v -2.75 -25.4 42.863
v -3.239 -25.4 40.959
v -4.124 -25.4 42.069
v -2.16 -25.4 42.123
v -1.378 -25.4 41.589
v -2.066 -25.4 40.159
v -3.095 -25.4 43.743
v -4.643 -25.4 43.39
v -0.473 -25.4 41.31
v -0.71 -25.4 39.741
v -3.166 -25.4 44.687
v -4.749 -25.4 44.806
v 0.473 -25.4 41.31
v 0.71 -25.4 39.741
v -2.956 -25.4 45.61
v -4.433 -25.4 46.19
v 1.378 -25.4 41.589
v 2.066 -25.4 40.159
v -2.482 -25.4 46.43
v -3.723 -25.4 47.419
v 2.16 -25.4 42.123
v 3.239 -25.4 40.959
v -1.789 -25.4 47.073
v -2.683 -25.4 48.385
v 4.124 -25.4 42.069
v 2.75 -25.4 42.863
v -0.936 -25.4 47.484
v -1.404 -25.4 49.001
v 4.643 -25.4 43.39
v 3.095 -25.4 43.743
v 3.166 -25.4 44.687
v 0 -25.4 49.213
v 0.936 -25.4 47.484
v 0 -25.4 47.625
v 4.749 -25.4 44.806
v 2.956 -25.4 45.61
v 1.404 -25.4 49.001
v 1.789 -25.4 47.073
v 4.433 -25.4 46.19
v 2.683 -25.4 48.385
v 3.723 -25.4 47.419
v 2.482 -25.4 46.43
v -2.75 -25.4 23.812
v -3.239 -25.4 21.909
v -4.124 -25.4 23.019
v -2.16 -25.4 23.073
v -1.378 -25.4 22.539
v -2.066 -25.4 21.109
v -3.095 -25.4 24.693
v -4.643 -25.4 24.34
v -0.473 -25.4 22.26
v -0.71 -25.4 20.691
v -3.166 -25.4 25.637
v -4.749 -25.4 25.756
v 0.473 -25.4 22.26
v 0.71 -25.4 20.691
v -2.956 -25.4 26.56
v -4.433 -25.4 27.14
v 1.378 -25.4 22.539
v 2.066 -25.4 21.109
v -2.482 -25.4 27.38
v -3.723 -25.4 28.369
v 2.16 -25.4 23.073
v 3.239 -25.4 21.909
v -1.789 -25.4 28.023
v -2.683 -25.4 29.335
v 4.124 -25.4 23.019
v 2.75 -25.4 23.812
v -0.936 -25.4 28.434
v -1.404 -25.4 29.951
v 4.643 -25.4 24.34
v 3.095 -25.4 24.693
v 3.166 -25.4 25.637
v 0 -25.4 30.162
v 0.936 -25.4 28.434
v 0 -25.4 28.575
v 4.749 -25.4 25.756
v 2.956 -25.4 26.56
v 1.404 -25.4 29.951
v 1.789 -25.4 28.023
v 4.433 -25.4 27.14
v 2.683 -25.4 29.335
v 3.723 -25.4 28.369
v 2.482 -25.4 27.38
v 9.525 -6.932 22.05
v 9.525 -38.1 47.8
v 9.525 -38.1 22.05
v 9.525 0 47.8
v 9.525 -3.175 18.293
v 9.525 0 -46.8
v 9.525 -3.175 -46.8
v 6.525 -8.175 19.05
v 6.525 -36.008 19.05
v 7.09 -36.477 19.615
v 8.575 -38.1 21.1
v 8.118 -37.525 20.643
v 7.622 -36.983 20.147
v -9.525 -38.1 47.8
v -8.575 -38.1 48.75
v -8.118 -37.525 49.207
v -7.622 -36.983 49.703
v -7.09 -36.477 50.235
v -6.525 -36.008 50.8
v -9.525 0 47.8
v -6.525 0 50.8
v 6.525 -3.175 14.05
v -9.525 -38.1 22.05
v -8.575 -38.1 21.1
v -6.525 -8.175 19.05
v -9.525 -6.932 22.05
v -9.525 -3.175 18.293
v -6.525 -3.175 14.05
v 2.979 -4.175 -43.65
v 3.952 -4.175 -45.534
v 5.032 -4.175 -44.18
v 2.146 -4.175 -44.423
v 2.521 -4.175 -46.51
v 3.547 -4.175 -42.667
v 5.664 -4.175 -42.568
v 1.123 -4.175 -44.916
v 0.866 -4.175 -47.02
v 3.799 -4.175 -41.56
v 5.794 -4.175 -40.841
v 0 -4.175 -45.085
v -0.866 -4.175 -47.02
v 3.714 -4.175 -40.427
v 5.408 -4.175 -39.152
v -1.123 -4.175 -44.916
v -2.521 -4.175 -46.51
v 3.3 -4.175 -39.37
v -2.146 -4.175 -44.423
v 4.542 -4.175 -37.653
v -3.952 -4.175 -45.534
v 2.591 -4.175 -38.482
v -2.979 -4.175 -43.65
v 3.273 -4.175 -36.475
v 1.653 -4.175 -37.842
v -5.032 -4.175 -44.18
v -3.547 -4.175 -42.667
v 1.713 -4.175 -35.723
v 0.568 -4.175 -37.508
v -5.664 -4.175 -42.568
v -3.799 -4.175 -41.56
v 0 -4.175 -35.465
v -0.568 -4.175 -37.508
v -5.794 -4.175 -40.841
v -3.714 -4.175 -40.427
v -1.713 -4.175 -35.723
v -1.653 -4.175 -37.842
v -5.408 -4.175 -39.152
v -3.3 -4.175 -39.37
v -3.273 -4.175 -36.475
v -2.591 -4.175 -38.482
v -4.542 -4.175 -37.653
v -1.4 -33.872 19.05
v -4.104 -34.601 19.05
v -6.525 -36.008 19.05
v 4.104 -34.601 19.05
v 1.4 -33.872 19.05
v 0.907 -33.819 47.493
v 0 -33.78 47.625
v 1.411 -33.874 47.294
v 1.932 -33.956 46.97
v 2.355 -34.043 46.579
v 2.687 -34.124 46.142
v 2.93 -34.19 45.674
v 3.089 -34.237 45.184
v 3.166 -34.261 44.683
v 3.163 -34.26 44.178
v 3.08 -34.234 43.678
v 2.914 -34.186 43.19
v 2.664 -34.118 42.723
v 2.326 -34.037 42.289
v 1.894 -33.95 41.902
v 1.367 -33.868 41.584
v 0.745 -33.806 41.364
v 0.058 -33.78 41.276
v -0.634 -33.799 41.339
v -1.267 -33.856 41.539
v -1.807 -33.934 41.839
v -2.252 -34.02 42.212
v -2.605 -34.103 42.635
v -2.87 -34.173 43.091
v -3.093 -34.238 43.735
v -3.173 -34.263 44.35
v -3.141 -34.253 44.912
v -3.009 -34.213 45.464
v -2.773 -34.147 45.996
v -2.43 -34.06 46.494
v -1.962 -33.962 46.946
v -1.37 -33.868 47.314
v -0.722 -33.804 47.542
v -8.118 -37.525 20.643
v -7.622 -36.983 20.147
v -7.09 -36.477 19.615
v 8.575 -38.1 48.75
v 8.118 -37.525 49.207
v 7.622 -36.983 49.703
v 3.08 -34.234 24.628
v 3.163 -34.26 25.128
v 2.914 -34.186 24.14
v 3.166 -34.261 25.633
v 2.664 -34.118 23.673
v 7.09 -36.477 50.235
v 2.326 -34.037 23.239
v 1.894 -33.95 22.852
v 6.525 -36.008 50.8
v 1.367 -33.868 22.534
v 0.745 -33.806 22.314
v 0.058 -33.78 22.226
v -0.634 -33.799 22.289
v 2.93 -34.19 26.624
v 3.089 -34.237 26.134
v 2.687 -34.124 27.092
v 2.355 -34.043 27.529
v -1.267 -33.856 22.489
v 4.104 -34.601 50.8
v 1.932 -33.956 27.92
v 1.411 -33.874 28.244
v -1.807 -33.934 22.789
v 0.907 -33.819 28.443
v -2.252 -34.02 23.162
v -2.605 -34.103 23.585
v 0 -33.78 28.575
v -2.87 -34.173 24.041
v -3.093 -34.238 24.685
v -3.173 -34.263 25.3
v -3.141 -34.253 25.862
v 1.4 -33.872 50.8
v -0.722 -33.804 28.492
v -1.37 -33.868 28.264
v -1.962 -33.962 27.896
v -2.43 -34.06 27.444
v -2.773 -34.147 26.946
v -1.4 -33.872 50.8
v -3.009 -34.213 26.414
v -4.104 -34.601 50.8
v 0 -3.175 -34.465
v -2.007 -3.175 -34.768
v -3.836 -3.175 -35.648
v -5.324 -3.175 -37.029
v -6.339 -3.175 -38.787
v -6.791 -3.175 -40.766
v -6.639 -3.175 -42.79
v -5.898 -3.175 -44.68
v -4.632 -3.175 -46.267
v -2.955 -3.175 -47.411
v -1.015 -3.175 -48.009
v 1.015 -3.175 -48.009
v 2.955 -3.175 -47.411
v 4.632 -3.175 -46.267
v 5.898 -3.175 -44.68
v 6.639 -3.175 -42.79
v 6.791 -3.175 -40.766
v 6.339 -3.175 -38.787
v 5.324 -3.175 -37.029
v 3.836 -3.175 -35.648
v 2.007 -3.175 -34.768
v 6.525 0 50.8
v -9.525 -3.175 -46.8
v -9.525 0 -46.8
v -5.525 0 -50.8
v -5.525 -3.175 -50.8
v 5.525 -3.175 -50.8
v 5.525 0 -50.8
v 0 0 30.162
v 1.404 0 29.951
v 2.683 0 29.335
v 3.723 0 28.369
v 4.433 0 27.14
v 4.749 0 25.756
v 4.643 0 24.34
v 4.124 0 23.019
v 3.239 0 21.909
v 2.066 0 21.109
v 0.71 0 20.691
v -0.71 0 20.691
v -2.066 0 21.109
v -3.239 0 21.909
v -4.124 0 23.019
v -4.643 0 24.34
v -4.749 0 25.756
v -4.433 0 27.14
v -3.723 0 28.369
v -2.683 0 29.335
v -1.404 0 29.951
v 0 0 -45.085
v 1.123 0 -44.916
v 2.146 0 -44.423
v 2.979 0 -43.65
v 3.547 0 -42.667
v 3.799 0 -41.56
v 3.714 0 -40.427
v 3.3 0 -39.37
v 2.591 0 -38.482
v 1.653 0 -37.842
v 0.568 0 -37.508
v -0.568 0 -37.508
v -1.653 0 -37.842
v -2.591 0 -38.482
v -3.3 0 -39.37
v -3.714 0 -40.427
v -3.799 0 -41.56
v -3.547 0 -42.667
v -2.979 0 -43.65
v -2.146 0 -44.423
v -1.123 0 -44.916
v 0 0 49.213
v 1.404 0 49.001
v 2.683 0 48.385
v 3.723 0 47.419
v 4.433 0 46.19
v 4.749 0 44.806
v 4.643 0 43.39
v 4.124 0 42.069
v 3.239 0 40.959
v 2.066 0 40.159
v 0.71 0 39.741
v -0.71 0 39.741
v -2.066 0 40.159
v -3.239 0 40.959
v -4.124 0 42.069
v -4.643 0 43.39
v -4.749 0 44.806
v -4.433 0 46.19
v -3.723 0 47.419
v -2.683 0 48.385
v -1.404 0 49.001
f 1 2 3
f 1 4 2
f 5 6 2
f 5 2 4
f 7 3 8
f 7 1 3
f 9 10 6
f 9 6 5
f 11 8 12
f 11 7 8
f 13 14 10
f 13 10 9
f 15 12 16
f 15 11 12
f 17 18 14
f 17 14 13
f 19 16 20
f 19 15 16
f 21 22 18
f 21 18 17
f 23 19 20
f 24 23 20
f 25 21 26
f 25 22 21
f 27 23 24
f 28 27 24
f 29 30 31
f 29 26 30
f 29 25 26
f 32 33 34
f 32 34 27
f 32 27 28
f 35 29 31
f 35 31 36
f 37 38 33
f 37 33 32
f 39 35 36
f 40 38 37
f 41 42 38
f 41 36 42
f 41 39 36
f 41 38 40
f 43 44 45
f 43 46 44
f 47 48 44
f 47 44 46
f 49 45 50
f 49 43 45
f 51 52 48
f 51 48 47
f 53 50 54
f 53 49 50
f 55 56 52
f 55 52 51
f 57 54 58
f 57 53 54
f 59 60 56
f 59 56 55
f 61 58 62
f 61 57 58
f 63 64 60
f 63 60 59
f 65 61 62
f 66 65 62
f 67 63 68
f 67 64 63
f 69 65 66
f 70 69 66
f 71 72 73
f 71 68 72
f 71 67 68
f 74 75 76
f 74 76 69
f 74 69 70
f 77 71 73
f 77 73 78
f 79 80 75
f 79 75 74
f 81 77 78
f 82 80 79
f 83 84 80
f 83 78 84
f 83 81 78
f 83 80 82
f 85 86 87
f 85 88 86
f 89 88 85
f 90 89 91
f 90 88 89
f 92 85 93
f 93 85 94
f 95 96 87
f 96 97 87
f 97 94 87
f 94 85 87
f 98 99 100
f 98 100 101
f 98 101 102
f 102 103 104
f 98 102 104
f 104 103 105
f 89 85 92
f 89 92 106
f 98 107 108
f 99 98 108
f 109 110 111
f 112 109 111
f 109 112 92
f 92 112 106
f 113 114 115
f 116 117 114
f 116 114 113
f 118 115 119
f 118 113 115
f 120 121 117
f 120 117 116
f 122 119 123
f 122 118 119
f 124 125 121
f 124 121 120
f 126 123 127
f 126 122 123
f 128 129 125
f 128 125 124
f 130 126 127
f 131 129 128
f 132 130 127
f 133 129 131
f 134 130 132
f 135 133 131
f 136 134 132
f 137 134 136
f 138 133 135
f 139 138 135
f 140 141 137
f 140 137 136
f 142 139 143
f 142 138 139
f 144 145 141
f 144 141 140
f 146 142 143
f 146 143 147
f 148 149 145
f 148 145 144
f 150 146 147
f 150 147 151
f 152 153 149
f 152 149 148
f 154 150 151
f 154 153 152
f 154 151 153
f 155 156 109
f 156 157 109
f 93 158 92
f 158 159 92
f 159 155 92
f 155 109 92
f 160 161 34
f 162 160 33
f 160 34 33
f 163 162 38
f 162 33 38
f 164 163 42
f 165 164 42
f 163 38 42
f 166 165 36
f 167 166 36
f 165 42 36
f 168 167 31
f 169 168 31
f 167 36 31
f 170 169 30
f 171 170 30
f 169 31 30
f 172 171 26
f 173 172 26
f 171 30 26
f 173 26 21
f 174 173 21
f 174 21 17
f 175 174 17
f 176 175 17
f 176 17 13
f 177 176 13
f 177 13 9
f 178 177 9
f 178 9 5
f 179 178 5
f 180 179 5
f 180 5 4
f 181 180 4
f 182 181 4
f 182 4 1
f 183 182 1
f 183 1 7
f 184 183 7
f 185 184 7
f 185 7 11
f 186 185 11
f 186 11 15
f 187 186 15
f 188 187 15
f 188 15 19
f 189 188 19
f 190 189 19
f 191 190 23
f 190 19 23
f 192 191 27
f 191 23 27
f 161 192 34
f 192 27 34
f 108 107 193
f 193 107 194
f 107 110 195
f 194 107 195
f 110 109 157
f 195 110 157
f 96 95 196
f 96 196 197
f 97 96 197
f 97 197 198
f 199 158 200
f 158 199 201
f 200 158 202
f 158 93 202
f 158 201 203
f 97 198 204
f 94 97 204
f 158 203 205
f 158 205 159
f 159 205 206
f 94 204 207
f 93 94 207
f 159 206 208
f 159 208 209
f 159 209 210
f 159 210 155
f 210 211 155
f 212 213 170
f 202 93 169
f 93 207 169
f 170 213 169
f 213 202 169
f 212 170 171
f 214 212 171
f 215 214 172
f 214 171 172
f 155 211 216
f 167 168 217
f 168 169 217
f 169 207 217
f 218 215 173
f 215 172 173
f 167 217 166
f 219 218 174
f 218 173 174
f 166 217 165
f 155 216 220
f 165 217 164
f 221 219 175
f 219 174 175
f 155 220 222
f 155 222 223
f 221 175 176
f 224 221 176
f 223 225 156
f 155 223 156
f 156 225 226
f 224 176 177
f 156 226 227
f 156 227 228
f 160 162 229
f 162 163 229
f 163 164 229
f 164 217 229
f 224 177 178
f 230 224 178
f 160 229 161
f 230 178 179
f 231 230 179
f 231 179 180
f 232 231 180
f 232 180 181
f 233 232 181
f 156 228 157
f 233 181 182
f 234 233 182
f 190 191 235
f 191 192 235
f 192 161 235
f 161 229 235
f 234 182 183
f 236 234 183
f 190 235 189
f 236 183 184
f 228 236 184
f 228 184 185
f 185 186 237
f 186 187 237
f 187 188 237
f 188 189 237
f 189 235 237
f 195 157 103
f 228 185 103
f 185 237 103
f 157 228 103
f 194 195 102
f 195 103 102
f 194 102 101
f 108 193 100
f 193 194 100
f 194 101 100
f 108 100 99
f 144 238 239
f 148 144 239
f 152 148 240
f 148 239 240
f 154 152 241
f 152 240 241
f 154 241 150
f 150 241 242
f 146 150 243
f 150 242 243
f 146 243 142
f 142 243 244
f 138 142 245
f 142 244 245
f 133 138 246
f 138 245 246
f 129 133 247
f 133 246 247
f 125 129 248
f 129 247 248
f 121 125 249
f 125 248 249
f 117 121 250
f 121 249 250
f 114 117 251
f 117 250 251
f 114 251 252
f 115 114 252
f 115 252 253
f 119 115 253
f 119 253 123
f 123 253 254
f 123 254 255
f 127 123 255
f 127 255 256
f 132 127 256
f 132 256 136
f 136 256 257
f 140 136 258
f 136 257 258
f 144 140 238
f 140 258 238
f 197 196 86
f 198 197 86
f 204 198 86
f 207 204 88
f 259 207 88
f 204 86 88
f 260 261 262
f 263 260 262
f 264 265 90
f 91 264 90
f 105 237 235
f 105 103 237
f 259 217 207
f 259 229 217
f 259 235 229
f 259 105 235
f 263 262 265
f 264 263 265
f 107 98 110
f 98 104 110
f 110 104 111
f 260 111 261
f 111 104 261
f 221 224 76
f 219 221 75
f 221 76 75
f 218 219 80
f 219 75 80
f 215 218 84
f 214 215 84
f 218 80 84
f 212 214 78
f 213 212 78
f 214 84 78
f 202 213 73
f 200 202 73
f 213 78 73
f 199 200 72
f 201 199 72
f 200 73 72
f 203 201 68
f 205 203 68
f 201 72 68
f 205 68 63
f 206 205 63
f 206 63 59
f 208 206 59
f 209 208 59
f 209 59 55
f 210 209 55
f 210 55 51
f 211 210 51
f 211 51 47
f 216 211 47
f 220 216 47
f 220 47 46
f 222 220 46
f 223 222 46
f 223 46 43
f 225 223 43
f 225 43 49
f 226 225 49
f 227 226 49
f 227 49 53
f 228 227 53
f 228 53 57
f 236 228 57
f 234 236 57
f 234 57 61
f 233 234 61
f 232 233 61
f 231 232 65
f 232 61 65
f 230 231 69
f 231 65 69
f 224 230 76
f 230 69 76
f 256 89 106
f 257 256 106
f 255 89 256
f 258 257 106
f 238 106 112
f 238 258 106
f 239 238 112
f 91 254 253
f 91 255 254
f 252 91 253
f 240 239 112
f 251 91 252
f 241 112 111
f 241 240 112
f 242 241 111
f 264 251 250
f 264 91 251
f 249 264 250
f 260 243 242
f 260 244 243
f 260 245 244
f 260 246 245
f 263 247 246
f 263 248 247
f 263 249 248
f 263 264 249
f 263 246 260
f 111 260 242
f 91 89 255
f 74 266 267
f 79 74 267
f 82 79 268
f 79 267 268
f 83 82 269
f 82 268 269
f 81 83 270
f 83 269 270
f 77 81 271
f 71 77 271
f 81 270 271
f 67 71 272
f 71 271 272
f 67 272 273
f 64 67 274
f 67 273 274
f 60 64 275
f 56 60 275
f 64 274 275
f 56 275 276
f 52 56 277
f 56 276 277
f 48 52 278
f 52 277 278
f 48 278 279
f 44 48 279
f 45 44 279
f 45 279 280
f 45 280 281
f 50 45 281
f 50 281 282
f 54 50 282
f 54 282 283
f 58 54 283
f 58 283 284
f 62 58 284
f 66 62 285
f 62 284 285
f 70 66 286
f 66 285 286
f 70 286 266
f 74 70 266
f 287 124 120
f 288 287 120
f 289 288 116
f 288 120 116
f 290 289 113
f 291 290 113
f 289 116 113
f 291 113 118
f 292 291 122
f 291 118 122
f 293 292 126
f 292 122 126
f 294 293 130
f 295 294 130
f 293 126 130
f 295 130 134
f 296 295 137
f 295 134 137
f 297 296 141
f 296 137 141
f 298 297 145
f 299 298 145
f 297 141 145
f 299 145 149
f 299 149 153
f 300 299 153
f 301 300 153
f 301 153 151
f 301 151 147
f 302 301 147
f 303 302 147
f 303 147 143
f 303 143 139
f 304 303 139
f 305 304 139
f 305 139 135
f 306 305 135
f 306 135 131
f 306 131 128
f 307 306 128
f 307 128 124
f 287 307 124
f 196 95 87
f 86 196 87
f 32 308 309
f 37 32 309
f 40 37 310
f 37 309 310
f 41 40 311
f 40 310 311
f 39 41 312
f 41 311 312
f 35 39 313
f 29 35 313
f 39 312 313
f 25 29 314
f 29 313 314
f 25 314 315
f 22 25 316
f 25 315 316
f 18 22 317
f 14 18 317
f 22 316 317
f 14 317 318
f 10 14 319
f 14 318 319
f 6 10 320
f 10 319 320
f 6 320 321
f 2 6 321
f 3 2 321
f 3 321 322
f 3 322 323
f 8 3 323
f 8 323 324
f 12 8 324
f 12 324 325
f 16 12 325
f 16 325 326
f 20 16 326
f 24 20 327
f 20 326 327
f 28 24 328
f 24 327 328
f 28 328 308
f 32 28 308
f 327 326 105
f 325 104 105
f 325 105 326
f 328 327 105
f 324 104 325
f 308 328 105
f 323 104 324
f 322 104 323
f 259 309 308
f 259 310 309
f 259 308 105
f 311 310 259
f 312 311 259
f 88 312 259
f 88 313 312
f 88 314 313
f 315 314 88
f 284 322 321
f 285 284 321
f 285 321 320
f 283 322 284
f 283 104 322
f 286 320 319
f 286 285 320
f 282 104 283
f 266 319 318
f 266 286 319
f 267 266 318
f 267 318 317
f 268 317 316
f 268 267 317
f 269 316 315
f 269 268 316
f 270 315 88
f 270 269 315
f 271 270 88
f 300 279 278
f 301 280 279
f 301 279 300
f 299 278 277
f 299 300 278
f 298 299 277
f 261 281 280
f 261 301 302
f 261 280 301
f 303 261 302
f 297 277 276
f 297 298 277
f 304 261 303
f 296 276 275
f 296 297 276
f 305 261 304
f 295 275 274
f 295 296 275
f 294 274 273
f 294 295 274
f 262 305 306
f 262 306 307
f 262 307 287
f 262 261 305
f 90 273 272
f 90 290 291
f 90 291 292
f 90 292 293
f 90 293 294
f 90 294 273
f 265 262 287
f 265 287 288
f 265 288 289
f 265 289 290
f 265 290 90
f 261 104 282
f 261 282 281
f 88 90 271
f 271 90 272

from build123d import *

# Parameters (mm, degrees)
SKETCH1_W           = 19.05
SKETCH1_H           = 31.75
SKETCH1_R           = 3.175
BOSS_EXTRUDE1_DEPTH = 38.1
SKETCH1_8_R         = 3.175
BOSS_EXTRUDE4_DEPTH = 3.175
SKETCH2_R           = 4.7625
CUT_EXTRUDE1_DEPTH  = 25.4
CHAMFER1_SIZE       = 5
CHAMFER2_SIZE       = 3
SKETCH3_R           = 10.67
CUT_EXTRUDE2_DEPTH  = 109.92610167
SKETCH6_R           = 3.81
CUT_EXTRUDE3_DEPTH  = 5.175
BOSS_EXTRUDE6_START = 1
SKETCH6_3_R         = 5.81
SKETCH6_3_R_2       = 3.81
BOSS_EXTRUDE6_DEPTH = 1
CHAMFER3_SIZE       = 1


with BuildPart() as part:
    # Sketch1 → Boss-Extrude1 (new body)
    with BuildSketch(Plane(origin=(0, 0, 0), x_dir=(1, 0, 0), z_dir=(0, 1, 0))):
        with Locations((0, -34.925)):
            Rectangle(SKETCH1_W, SKETCH1_H)
        with Locations(Location((0, -44.45, 0), (0, 0, 270))):
            Circle(SKETCH1_R, mode=Mode.SUBTRACT)
        with Locations(Location((0, -25.4, 0), (0, 0, 270))):
            Circle(SKETCH1_R, mode=Mode.SUBTRACT)
    extrude(amount=-BOSS_EXTRUDE1_DEPTH)

    # Sketch1<8> → Boss-Extrude4 (add)
    with BuildSketch(Plane(origin=(0, 0, 0), x_dir=(1, 0, 0), z_dir=(0, 1, 0))):
        Polygon((9.525, -50.8), (-9.525, -50.8), (-9.525, 46.8), (-5.525, 50.8), (5.525, 50.8), (9.525, 46.8), align=None)
        with Locations(Location((0, -25.4, 0), (0, 0, 270))):
            Circle(SKETCH1_8_R, mode=Mode.SUBTRACT)
        with Locations(Location((0, -44.45, 0), (0, 0, 270))):
            Circle(SKETCH1_8_R, mode=Mode.SUBTRACT)
    extrude(amount=-BOSS_EXTRUDE4_DEPTH)

    # Sketch2 → Cut-Extrude1 (cut)
    with BuildSketch(Plane(origin=(0, 0, 0), x_dir=(1, 0, 0), z_dir=(0, 1, 0))):
        with Locations(Location((0, -25.4, 0), (0, 0, 270))):
            Circle(SKETCH2_R)
        with Locations(Location((0, -44.45, 0), (0, 0, 270))):
            Circle(SKETCH2_R)
    extrude(amount=-CUT_EXTRUDE1_DEPTH, mode=Mode.SUBTRACT)

    # Chamfer1
    chamfer1_edges = [part.edges().sort_by_distance(p)[0] for p in [
        (0, -3.175, 19.05),
    ]]
    chamfer(chamfer1_edges, length=CHAMFER1_SIZE)

    # Chamfer2
    chamfer2_edges = [part.edges().sort_by_distance(p)[0] for p in [
        (-9.525, -23.1375, 19.05),
        (9.525, -23.1375, 19.05),
        (9.525, -19.05, 50.8),
        (-9.525, -19.05, 50.8),
        (9.525, -5.675, 16.55),
        (-9.525, -5.675, 16.55),
    ]]
    chamfer(chamfer2_edges, length=CHAMFER2_SIZE)

    # Sketch3 → Cut-Extrude2 (cut, through all)
    with BuildSketch(Plane.XY.offset(50.8)):
        with Locations((0, -44.45)):
            Circle(SKETCH3_R)
    extrude(amount=-CUT_EXTRUDE2_DEPTH, mode=Mode.SUBTRACT)

    # Sketch6 → Cut-Extrude3 (cut)
    with BuildSketch(Plane.XZ.offset(3.175)):
        with Locations(Location((0, -41.275, 0), (0, 0, 270))):
            Circle(SKETCH6_R)
    extrude(amount=-CUT_EXTRUDE3_DEPTH, mode=Mode.SUBTRACT)

    # Sketch6<3> → Boss-Extrude6 (add)
    with BuildSketch(Plane.XZ.offset(3.175).offset(BOSS_EXTRUDE6_START)):
        with Locations(Location((0, -41.275, 0), (0, 0, 90))):
            Circle(SKETCH6_3_R)
        with Locations(Location((0, -41.275, 0), (0, 0, 270))):
            Circle(SKETCH6_3_R_2, mode=Mode.SUBTRACT)
    extrude(amount=-BOSS_EXTRUDE6_DEPTH)

    # Chamfer3
    chamfer3_edges = [part.edges().sort_by_distance(p)[0] for p in [
        (0, -3.175, -47.085),
    ]]
    chamfer(chamfer3_edges, length=CHAMFER3_SIZE - 0.0001)  # a hair under: the kernel refuses the full size


solid = part.part
